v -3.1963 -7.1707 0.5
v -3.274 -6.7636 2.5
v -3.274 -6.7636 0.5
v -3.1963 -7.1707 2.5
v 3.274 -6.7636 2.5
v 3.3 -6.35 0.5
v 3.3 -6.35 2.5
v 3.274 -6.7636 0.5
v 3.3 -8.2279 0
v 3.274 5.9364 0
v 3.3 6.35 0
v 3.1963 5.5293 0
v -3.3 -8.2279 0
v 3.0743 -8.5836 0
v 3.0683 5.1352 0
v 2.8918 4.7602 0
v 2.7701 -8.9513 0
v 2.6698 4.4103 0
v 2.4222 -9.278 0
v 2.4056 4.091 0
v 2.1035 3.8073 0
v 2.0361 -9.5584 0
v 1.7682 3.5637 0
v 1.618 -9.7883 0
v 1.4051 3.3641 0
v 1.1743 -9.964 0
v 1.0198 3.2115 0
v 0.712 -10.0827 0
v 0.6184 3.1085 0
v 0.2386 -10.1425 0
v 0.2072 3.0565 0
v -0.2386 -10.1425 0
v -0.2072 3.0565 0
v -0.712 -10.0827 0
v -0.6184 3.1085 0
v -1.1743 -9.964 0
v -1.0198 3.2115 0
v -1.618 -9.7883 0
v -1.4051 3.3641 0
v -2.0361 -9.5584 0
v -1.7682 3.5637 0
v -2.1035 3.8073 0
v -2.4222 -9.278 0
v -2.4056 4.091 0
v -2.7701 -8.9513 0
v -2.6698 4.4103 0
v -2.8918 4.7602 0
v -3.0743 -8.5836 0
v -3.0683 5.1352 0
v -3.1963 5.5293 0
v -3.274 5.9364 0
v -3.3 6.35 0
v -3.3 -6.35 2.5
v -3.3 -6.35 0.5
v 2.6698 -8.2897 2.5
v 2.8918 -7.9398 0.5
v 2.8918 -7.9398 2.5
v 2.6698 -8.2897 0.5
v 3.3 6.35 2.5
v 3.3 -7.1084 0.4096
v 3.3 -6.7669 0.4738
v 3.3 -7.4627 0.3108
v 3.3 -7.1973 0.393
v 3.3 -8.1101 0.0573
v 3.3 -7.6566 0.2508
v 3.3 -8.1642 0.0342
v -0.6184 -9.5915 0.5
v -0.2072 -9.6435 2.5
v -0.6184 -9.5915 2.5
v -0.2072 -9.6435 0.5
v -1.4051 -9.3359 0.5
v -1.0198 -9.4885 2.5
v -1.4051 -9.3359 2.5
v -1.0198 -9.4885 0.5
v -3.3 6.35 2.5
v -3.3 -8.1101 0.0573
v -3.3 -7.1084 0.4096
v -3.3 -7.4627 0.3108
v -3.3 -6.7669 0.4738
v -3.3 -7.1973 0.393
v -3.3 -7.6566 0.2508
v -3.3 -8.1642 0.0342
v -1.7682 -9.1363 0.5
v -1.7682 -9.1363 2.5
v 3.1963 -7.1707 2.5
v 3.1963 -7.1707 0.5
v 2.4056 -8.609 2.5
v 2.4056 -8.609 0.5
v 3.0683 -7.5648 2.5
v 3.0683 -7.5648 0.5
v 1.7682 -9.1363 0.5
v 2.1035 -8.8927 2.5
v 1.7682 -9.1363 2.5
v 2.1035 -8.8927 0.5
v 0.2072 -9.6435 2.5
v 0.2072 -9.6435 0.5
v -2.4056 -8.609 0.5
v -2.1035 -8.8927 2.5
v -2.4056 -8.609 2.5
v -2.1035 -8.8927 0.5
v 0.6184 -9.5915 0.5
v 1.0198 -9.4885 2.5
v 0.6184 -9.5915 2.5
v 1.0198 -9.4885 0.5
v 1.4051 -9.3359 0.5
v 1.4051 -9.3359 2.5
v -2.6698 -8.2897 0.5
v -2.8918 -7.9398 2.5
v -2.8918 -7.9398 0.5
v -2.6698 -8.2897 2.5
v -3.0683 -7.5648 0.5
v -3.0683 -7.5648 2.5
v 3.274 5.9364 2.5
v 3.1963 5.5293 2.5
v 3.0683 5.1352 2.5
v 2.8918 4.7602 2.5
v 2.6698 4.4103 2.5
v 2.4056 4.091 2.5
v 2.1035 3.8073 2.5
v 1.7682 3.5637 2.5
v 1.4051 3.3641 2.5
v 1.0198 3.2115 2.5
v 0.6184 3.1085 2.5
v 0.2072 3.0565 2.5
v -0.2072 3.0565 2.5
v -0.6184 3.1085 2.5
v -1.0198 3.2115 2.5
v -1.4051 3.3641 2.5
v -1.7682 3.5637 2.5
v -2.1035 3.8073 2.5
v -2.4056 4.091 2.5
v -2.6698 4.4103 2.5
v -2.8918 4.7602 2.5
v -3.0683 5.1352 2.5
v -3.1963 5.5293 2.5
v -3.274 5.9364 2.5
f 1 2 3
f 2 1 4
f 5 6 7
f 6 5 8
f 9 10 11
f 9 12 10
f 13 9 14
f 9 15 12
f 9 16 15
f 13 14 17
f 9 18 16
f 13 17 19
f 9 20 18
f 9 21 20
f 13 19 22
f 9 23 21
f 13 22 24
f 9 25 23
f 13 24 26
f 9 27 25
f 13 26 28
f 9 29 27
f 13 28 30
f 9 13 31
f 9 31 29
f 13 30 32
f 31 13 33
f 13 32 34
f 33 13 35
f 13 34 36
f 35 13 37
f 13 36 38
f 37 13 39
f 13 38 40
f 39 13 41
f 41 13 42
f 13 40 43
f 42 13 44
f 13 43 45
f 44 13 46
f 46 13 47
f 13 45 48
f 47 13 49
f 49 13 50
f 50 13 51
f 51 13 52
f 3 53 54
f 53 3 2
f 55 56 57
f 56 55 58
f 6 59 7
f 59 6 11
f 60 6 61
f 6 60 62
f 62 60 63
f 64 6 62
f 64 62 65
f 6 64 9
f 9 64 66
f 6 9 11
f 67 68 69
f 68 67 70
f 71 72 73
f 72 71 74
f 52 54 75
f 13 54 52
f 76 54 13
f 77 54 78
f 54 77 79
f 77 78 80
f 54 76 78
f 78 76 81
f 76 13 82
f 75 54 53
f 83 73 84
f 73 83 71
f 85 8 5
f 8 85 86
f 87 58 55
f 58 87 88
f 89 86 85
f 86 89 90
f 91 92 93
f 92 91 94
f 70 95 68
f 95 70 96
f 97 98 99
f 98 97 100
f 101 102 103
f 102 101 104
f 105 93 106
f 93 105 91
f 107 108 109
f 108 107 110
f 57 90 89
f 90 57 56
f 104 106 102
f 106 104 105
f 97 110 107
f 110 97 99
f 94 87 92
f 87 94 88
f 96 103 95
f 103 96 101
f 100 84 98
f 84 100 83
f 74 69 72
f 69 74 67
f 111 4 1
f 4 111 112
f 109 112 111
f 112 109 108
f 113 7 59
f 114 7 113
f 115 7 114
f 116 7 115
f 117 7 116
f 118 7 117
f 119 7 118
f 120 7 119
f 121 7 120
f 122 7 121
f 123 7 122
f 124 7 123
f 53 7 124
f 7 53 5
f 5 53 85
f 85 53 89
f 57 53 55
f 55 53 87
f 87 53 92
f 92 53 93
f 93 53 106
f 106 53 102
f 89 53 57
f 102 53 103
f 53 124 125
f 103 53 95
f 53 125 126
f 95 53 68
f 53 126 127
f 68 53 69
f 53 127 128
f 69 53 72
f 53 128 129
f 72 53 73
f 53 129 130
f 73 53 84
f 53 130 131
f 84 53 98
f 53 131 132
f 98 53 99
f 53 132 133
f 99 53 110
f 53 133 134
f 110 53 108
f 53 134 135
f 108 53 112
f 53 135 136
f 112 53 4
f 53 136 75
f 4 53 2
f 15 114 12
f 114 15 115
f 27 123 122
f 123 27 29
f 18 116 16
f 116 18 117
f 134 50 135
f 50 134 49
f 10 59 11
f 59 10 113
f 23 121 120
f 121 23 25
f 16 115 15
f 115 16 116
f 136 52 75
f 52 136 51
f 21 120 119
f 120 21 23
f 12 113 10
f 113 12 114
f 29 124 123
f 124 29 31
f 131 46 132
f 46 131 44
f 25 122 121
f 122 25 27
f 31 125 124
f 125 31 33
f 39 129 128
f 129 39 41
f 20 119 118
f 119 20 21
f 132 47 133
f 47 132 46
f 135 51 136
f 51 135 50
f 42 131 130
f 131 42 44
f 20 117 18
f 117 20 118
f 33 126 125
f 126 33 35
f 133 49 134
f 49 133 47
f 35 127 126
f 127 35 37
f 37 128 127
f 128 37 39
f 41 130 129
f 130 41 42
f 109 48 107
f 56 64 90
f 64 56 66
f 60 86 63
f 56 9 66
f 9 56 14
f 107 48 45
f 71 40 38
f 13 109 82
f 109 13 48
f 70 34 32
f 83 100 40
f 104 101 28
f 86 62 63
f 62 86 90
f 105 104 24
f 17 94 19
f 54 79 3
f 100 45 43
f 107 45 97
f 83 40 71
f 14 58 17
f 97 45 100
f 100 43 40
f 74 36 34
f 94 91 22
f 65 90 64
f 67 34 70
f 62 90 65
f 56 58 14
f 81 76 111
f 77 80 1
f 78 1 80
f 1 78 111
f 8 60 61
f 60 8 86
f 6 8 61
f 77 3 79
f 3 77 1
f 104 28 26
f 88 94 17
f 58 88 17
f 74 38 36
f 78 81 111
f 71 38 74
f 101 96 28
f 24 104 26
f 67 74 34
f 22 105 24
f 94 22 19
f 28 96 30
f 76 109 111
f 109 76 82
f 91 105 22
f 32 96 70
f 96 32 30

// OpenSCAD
part_b_outer_d = 6.6;
part_b_h = 2.5;

hole_d = 6.6;
hole_center_distance = 12.7;

module hull_shape(d, hole_center_distance) {
  hull() {
    translate([0, hole_center_distance / 2, 0])
      circle(d = d, $fn = 50);
    translate([0, -hole_center_distance / 2, 0])
      circle(d = d, $fn = 50);
  }
}

module main_body() {
  difference() {
    linear_extrude(height = part_b_h) {
      hull_shape(
        d = part_b_outer_d,
        hole_center_distance = hole_center_distance
      );
    }

    total_height = part_b_h;
    translate([0, hole_center_distance / 2, -1])
      cylinder(d = hole_d, h = total_height + 2, $fn = 50);

    // Cut above the bolt hole centerline to create a flat top
    cut_size = 30;
    translate([-cut_size / 2, hole_center_distance / 2, -1])
      cube([cut_size, cut_size, total_height + 2]);
  }
}

module anti_slip_flare() {
    y_center = -hole_center_distance / 2;
    flare_height = 0.5;
    flare_radius_increase = flare_height;

    d_top = part_b_outer_d;
    d_bottom = part_b_outer_d + 2 * flare_radius_increase;

    intersection() {
        // Full cone
        translate([0, y_center, 0])
            cylinder(h = flare_height, d1 = d_bottom, d2 = d_top, $fn = 50);

        // Keep -Y half only
        cut_box_size = d_bottom * 1.5;
        translate([-cut_box_size / 2, y_center - cut_box_size, -1])
            cube([cut_box_size, cut_box_size, flare_height + 2]);

        // Constrain width to +/-3.3mm
        x_constraint = 3.3;
        y_size = d_bottom * 2;
        translate([-x_constraint, y_center - y_size / 2, -1])
            cube([x_constraint * 2, y_size, flare_height + 2]);
    }
}

union() {
    main_body();
    anti_slip_flare();
}
